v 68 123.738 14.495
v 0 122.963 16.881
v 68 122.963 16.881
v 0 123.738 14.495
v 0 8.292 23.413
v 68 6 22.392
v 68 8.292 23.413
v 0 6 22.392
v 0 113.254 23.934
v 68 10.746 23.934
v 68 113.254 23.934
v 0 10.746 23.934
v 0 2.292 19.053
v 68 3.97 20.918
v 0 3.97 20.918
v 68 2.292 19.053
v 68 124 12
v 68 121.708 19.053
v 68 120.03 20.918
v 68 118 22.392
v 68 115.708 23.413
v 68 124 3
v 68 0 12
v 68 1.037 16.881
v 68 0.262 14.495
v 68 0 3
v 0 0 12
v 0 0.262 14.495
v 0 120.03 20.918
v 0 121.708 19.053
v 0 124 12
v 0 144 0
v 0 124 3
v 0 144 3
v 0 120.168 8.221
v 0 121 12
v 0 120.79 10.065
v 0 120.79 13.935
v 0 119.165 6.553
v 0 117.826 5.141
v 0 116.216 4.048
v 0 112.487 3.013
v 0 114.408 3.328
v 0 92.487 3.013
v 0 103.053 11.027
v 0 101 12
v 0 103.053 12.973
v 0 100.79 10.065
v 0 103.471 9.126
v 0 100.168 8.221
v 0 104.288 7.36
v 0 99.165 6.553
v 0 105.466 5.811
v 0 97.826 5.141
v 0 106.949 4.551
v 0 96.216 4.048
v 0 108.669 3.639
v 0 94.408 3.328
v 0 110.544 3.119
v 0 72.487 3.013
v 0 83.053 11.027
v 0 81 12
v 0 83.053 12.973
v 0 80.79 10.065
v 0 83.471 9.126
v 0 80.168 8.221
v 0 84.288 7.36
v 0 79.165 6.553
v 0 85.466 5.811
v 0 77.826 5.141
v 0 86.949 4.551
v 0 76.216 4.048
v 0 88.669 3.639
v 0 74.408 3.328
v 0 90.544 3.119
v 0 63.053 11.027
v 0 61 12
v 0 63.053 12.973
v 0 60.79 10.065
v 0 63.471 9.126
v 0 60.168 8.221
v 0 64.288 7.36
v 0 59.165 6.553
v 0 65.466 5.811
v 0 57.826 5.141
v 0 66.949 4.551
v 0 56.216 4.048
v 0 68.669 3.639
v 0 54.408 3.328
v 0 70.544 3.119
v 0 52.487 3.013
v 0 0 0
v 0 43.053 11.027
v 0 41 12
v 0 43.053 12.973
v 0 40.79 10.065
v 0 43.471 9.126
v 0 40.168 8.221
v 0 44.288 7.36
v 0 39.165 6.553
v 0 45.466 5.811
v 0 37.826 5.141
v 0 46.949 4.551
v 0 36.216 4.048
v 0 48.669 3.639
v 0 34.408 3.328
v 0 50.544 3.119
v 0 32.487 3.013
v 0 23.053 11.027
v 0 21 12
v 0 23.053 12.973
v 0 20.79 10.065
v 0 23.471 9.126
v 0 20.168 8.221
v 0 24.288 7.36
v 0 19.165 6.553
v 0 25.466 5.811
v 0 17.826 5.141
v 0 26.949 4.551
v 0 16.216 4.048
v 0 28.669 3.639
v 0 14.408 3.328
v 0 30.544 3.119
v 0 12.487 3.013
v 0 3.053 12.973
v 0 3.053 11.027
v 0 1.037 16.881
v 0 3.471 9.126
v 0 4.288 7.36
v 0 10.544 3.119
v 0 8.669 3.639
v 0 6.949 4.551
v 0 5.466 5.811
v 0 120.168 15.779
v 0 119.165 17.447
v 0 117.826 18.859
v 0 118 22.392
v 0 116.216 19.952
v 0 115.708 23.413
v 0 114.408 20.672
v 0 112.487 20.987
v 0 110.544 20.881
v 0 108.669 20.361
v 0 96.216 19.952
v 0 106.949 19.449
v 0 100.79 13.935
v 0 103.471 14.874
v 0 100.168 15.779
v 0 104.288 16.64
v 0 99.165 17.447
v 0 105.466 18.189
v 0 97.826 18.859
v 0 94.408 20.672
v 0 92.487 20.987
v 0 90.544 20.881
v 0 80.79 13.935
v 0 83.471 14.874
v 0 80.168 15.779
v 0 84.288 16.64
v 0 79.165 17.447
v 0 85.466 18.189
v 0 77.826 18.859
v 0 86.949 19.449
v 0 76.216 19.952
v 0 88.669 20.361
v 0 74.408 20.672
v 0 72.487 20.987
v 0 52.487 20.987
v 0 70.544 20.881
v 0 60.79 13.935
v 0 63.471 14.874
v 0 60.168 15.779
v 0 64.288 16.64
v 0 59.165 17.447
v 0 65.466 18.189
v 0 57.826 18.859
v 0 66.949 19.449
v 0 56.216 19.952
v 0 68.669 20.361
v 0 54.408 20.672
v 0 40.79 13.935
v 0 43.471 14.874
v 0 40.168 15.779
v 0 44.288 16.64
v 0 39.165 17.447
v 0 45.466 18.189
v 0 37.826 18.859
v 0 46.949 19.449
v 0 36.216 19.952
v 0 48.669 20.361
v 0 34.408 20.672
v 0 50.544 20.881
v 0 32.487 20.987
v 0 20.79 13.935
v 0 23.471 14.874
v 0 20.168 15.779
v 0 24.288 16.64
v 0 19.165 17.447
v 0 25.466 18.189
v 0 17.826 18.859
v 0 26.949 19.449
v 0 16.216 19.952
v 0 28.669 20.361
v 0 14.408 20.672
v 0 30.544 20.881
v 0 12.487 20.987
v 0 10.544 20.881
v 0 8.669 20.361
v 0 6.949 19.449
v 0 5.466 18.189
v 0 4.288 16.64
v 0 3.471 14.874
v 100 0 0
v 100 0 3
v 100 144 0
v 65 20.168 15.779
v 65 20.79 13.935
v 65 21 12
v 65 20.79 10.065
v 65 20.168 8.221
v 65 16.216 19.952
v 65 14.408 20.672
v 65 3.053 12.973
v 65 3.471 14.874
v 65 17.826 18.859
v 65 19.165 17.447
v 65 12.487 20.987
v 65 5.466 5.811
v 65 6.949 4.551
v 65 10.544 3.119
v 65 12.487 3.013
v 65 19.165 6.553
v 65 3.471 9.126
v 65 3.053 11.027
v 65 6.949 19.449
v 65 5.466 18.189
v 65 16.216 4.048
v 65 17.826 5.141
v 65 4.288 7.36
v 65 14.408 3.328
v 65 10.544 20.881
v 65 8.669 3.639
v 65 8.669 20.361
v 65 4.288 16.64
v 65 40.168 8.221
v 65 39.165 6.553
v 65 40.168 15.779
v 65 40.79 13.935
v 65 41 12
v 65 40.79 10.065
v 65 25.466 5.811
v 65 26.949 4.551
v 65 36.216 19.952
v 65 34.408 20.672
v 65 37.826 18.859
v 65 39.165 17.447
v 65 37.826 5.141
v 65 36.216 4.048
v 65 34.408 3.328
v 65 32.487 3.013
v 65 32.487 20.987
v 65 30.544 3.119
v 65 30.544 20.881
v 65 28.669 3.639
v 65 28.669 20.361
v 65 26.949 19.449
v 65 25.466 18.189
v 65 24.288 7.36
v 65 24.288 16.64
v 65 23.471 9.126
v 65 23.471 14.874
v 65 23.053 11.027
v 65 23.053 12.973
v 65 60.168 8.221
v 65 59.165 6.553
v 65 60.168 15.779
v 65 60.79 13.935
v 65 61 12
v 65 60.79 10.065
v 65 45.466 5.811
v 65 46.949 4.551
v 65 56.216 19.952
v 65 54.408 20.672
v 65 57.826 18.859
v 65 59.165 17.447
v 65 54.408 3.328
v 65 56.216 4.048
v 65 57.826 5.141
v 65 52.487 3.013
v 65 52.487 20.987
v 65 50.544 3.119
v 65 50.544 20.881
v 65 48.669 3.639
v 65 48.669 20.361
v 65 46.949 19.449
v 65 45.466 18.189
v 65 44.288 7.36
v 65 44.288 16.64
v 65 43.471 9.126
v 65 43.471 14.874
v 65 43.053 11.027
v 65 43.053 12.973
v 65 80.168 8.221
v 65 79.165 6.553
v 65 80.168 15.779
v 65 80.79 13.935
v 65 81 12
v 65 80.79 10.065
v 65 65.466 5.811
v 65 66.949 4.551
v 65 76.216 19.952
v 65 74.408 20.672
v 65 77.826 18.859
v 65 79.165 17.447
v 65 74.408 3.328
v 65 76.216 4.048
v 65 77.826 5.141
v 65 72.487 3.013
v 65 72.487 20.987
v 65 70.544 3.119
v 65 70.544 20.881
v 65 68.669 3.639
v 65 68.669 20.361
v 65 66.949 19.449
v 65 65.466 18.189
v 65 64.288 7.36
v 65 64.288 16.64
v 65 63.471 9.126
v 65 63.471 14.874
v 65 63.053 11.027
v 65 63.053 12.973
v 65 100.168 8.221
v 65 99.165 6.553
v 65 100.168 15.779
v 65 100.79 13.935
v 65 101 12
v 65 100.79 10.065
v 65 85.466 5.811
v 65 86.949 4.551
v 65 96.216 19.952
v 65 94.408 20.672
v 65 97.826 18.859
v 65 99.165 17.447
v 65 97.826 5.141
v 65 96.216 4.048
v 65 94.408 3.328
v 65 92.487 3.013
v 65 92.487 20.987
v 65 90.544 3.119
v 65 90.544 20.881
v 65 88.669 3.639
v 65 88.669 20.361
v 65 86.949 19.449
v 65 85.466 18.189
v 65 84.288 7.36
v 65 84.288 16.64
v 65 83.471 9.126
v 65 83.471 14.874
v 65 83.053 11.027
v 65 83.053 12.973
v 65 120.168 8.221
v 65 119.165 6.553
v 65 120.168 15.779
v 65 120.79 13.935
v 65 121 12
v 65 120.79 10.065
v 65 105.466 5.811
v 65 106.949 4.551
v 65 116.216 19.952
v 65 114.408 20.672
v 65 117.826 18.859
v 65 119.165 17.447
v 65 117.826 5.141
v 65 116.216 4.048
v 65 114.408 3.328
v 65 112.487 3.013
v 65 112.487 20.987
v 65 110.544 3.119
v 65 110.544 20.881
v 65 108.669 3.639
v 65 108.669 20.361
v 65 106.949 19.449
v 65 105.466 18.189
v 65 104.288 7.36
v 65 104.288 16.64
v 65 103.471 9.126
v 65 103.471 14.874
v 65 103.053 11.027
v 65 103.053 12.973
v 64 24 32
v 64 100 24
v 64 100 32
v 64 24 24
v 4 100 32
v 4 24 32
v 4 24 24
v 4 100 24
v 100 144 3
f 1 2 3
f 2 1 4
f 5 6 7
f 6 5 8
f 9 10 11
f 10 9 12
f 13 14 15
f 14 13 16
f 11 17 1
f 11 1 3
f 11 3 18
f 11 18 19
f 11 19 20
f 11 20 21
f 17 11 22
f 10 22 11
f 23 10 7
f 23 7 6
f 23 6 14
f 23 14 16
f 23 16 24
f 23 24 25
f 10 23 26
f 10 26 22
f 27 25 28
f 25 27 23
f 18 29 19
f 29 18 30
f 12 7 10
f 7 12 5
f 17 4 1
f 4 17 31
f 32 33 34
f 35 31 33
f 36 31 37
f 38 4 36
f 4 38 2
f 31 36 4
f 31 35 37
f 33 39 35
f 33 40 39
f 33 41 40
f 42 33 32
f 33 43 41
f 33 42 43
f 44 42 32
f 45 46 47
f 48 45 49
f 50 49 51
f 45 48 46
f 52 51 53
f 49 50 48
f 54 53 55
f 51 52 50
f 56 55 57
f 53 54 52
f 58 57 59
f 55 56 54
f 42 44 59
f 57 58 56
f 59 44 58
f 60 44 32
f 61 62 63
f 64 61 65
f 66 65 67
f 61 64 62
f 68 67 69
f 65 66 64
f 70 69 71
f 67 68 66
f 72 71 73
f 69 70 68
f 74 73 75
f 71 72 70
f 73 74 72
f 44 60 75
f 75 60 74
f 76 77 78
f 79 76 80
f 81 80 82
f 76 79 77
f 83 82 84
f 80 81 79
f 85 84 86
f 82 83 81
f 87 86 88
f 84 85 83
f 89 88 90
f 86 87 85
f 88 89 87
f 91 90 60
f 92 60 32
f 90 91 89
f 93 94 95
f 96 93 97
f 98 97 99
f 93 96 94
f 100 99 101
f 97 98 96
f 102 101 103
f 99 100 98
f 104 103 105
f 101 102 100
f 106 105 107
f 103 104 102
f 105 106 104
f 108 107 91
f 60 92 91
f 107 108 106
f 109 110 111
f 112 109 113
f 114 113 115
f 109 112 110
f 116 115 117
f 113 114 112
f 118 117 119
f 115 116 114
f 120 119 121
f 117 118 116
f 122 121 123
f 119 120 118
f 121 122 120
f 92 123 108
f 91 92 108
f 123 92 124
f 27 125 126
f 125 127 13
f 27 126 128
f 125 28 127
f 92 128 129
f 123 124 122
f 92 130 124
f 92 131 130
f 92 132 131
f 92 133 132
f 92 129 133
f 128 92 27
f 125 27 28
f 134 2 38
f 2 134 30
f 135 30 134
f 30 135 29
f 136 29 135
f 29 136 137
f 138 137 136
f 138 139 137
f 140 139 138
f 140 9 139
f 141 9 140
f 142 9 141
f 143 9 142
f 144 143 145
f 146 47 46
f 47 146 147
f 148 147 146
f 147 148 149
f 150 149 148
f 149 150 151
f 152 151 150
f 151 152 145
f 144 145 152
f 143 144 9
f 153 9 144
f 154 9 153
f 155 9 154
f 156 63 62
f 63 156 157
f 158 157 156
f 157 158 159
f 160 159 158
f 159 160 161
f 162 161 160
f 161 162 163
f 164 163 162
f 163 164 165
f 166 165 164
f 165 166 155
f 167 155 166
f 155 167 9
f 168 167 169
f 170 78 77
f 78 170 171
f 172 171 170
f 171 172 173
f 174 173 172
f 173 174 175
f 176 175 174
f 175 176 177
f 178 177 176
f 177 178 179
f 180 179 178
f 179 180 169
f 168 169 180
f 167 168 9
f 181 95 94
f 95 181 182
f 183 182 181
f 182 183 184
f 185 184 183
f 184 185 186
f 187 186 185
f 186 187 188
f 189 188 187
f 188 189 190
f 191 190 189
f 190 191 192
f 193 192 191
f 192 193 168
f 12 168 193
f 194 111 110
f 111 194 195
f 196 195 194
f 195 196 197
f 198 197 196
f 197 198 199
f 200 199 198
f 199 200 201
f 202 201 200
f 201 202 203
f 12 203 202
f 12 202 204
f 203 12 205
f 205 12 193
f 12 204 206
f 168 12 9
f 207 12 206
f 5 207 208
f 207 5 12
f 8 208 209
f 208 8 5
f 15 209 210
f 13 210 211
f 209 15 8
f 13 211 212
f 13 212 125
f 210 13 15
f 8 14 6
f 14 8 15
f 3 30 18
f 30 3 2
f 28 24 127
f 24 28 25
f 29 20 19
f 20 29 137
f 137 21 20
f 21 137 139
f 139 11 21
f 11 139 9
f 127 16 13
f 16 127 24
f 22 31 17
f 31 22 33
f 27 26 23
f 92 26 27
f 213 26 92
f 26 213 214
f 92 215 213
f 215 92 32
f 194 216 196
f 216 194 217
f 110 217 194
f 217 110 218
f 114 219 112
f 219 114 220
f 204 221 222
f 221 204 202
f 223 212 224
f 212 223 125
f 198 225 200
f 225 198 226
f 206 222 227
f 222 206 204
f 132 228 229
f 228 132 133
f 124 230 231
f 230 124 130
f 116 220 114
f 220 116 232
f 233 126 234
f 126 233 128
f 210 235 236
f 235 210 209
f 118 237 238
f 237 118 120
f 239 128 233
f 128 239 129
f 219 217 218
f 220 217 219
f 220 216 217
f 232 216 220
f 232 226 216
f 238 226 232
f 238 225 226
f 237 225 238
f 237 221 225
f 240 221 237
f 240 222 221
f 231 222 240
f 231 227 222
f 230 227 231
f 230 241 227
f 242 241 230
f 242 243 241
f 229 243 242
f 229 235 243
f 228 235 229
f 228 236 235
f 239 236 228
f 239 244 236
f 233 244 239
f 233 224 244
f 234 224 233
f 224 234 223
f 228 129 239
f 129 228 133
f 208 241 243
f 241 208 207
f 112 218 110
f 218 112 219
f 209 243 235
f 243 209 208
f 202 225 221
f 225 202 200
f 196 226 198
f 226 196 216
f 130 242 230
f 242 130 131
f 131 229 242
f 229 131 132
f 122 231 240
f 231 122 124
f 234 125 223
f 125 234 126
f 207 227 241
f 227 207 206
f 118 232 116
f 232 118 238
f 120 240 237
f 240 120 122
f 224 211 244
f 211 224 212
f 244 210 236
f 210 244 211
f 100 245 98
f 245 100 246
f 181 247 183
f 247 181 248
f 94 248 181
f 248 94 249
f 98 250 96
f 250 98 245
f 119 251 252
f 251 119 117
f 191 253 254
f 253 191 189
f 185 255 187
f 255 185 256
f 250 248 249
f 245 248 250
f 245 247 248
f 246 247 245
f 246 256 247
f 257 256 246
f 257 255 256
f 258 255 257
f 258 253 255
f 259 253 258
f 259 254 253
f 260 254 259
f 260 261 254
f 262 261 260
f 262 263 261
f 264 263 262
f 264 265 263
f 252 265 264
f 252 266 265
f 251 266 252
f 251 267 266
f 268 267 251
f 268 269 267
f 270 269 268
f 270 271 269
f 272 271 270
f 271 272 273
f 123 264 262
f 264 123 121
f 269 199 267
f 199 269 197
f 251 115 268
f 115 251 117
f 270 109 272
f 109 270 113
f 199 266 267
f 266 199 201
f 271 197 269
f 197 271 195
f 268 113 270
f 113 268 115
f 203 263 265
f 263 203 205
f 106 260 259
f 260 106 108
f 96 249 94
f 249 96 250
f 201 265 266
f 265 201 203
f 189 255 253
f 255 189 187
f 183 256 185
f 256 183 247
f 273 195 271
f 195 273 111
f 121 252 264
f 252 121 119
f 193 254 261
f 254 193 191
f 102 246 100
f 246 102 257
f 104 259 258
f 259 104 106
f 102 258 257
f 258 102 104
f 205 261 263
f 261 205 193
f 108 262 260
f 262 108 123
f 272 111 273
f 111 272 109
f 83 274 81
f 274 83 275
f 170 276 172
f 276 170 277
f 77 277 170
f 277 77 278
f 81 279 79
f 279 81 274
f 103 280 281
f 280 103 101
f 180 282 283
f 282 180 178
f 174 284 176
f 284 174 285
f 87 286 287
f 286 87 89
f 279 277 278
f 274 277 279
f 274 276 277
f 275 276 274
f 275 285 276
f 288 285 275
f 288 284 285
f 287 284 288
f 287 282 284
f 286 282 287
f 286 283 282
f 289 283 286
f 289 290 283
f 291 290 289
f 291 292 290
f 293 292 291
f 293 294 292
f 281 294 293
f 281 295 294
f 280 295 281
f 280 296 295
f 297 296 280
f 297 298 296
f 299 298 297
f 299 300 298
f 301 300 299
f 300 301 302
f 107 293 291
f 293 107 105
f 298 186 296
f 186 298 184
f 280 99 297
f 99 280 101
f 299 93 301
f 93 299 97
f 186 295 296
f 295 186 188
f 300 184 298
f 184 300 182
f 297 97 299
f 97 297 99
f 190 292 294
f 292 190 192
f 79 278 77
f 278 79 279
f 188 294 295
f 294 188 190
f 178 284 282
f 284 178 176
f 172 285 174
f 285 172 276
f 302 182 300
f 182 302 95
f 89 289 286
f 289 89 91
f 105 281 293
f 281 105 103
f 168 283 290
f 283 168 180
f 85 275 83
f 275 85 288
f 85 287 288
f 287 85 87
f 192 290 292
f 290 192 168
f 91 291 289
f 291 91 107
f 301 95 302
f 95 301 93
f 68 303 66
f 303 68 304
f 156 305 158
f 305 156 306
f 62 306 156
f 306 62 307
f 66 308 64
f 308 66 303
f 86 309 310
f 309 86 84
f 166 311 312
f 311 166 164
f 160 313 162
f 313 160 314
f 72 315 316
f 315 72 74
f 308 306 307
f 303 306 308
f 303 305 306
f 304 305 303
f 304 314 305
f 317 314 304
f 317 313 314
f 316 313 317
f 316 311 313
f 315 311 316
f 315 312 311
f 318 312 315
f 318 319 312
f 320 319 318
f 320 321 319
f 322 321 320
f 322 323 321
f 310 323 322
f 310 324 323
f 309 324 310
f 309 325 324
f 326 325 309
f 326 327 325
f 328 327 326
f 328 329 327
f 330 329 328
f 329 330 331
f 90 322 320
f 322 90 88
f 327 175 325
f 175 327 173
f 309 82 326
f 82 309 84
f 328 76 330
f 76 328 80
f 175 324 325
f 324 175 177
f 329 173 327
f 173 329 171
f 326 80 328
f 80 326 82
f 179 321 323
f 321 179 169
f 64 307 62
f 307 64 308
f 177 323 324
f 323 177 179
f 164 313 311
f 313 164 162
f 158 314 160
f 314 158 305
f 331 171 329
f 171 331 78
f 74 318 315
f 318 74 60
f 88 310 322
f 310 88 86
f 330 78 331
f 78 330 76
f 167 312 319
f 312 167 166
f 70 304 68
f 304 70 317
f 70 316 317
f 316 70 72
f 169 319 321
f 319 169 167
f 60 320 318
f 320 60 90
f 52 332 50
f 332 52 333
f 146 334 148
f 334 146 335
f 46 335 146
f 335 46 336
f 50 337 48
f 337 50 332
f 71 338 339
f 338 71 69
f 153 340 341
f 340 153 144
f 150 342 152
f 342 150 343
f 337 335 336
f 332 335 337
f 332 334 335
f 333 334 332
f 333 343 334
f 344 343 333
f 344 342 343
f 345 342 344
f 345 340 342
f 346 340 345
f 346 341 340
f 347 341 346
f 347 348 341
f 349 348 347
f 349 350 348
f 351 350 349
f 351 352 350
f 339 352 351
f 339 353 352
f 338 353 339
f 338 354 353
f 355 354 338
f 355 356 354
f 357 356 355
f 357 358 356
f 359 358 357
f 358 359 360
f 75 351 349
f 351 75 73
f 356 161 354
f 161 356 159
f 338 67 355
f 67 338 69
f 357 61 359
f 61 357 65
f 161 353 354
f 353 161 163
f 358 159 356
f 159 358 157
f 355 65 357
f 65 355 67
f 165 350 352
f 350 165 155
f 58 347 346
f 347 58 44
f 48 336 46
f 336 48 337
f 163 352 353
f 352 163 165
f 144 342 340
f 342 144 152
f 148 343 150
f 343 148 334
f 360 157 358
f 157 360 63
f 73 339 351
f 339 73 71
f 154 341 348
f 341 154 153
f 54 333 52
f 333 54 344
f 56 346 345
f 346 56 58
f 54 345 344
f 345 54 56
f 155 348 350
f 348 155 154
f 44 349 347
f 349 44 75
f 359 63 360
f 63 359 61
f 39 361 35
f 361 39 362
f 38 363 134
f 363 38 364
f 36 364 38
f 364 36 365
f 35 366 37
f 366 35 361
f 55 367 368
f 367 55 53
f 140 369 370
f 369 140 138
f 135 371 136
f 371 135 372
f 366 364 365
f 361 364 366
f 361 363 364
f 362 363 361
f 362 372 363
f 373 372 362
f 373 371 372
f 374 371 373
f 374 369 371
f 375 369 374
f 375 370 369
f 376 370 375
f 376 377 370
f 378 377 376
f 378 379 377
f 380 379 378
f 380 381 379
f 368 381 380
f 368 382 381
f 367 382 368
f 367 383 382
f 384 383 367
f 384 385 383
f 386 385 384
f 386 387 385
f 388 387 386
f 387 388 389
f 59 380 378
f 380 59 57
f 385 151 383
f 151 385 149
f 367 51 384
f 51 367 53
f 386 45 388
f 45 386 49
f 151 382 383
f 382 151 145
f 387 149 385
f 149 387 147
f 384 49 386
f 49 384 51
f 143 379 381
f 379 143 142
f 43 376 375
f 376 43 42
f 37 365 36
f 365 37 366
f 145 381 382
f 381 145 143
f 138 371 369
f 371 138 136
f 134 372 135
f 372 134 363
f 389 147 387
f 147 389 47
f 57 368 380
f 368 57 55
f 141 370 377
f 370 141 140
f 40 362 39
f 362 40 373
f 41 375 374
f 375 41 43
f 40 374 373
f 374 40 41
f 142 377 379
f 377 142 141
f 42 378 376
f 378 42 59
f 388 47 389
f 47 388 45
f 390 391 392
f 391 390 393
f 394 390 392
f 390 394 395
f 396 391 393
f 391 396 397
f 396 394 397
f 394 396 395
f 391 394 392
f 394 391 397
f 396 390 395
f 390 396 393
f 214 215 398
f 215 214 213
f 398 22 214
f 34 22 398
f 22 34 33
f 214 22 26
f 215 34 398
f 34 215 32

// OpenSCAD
battery_diameter = 18;
battery_length = 65;
battery_holder_thickness = 3;
battery_holder_spacing = 2;
battery_count = 6;
battery_holder_height = battery_count * battery_diameter + 2 * battery_holder_thickness + battery_holder_spacing * (battery_count - 1);

base_width = 100;
base_height = battery_holder_height + 20;
base_thickness = 3;

pcb_width = 56;
pcb_height = 72;
pcb_thickness = 2;
pcb_holder_thickness = 2;
pcb_margin = 4;

cube([base_width, base_height, base_thickness]);

translate([0,0,0]) {
    difference() {
        union() {
            translate([0, battery_diameter/2+battery_holder_thickness, battery_diameter / 2+battery_holder_thickness]) {
                rotate([90, 0, 90]) {

                    difference() {
                        union() {
                            hull() {
                                cylinder(d=battery_diameter+battery_holder_thickness*2, h=battery_length+battery_holder_thickness);
                                translate([(battery_count - 1) * (battery_diameter + battery_holder_spacing), 0, 0]) {
                                    cylinder(d=battery_diameter+battery_holder_thickness*2, h=battery_length + battery_holder_thickness);
                                }
                            }
                            translate([-battery_diameter/2-battery_holder_thickness,-battery_diameter/2-battery_holder_thickness,0]) {
                                cube([battery_holder_height, battery_diameter/2+battery_holder_thickness, battery_length+battery_holder_thickness]);
                            }
                        }

                        for (x = [0:battery_count-1]) {
                            translate([(battery_diameter + battery_holder_spacing) * x, 0]) {
                                cylinder(d = battery_diameter, h=battery_length);
                            }
                        }
                    }
                }
            }
            translate([(battery_length + battery_holder_thickness) / 2 - (pcb_width+2*pcb_holder_thickness) / 2, battery_holder_height / 2 - (pcb_height+2*pcb_holder_thickness) / 2, battery_diameter+battery_holder_thickness*2]) {
                #cube([pcb_width+2*pcb_holder_thickness, pcb_height+2*pcb_holder_thickness, pcb_thickness+pcb_margin+pcb_holder_thickness]);
            }
        }
    }
}
